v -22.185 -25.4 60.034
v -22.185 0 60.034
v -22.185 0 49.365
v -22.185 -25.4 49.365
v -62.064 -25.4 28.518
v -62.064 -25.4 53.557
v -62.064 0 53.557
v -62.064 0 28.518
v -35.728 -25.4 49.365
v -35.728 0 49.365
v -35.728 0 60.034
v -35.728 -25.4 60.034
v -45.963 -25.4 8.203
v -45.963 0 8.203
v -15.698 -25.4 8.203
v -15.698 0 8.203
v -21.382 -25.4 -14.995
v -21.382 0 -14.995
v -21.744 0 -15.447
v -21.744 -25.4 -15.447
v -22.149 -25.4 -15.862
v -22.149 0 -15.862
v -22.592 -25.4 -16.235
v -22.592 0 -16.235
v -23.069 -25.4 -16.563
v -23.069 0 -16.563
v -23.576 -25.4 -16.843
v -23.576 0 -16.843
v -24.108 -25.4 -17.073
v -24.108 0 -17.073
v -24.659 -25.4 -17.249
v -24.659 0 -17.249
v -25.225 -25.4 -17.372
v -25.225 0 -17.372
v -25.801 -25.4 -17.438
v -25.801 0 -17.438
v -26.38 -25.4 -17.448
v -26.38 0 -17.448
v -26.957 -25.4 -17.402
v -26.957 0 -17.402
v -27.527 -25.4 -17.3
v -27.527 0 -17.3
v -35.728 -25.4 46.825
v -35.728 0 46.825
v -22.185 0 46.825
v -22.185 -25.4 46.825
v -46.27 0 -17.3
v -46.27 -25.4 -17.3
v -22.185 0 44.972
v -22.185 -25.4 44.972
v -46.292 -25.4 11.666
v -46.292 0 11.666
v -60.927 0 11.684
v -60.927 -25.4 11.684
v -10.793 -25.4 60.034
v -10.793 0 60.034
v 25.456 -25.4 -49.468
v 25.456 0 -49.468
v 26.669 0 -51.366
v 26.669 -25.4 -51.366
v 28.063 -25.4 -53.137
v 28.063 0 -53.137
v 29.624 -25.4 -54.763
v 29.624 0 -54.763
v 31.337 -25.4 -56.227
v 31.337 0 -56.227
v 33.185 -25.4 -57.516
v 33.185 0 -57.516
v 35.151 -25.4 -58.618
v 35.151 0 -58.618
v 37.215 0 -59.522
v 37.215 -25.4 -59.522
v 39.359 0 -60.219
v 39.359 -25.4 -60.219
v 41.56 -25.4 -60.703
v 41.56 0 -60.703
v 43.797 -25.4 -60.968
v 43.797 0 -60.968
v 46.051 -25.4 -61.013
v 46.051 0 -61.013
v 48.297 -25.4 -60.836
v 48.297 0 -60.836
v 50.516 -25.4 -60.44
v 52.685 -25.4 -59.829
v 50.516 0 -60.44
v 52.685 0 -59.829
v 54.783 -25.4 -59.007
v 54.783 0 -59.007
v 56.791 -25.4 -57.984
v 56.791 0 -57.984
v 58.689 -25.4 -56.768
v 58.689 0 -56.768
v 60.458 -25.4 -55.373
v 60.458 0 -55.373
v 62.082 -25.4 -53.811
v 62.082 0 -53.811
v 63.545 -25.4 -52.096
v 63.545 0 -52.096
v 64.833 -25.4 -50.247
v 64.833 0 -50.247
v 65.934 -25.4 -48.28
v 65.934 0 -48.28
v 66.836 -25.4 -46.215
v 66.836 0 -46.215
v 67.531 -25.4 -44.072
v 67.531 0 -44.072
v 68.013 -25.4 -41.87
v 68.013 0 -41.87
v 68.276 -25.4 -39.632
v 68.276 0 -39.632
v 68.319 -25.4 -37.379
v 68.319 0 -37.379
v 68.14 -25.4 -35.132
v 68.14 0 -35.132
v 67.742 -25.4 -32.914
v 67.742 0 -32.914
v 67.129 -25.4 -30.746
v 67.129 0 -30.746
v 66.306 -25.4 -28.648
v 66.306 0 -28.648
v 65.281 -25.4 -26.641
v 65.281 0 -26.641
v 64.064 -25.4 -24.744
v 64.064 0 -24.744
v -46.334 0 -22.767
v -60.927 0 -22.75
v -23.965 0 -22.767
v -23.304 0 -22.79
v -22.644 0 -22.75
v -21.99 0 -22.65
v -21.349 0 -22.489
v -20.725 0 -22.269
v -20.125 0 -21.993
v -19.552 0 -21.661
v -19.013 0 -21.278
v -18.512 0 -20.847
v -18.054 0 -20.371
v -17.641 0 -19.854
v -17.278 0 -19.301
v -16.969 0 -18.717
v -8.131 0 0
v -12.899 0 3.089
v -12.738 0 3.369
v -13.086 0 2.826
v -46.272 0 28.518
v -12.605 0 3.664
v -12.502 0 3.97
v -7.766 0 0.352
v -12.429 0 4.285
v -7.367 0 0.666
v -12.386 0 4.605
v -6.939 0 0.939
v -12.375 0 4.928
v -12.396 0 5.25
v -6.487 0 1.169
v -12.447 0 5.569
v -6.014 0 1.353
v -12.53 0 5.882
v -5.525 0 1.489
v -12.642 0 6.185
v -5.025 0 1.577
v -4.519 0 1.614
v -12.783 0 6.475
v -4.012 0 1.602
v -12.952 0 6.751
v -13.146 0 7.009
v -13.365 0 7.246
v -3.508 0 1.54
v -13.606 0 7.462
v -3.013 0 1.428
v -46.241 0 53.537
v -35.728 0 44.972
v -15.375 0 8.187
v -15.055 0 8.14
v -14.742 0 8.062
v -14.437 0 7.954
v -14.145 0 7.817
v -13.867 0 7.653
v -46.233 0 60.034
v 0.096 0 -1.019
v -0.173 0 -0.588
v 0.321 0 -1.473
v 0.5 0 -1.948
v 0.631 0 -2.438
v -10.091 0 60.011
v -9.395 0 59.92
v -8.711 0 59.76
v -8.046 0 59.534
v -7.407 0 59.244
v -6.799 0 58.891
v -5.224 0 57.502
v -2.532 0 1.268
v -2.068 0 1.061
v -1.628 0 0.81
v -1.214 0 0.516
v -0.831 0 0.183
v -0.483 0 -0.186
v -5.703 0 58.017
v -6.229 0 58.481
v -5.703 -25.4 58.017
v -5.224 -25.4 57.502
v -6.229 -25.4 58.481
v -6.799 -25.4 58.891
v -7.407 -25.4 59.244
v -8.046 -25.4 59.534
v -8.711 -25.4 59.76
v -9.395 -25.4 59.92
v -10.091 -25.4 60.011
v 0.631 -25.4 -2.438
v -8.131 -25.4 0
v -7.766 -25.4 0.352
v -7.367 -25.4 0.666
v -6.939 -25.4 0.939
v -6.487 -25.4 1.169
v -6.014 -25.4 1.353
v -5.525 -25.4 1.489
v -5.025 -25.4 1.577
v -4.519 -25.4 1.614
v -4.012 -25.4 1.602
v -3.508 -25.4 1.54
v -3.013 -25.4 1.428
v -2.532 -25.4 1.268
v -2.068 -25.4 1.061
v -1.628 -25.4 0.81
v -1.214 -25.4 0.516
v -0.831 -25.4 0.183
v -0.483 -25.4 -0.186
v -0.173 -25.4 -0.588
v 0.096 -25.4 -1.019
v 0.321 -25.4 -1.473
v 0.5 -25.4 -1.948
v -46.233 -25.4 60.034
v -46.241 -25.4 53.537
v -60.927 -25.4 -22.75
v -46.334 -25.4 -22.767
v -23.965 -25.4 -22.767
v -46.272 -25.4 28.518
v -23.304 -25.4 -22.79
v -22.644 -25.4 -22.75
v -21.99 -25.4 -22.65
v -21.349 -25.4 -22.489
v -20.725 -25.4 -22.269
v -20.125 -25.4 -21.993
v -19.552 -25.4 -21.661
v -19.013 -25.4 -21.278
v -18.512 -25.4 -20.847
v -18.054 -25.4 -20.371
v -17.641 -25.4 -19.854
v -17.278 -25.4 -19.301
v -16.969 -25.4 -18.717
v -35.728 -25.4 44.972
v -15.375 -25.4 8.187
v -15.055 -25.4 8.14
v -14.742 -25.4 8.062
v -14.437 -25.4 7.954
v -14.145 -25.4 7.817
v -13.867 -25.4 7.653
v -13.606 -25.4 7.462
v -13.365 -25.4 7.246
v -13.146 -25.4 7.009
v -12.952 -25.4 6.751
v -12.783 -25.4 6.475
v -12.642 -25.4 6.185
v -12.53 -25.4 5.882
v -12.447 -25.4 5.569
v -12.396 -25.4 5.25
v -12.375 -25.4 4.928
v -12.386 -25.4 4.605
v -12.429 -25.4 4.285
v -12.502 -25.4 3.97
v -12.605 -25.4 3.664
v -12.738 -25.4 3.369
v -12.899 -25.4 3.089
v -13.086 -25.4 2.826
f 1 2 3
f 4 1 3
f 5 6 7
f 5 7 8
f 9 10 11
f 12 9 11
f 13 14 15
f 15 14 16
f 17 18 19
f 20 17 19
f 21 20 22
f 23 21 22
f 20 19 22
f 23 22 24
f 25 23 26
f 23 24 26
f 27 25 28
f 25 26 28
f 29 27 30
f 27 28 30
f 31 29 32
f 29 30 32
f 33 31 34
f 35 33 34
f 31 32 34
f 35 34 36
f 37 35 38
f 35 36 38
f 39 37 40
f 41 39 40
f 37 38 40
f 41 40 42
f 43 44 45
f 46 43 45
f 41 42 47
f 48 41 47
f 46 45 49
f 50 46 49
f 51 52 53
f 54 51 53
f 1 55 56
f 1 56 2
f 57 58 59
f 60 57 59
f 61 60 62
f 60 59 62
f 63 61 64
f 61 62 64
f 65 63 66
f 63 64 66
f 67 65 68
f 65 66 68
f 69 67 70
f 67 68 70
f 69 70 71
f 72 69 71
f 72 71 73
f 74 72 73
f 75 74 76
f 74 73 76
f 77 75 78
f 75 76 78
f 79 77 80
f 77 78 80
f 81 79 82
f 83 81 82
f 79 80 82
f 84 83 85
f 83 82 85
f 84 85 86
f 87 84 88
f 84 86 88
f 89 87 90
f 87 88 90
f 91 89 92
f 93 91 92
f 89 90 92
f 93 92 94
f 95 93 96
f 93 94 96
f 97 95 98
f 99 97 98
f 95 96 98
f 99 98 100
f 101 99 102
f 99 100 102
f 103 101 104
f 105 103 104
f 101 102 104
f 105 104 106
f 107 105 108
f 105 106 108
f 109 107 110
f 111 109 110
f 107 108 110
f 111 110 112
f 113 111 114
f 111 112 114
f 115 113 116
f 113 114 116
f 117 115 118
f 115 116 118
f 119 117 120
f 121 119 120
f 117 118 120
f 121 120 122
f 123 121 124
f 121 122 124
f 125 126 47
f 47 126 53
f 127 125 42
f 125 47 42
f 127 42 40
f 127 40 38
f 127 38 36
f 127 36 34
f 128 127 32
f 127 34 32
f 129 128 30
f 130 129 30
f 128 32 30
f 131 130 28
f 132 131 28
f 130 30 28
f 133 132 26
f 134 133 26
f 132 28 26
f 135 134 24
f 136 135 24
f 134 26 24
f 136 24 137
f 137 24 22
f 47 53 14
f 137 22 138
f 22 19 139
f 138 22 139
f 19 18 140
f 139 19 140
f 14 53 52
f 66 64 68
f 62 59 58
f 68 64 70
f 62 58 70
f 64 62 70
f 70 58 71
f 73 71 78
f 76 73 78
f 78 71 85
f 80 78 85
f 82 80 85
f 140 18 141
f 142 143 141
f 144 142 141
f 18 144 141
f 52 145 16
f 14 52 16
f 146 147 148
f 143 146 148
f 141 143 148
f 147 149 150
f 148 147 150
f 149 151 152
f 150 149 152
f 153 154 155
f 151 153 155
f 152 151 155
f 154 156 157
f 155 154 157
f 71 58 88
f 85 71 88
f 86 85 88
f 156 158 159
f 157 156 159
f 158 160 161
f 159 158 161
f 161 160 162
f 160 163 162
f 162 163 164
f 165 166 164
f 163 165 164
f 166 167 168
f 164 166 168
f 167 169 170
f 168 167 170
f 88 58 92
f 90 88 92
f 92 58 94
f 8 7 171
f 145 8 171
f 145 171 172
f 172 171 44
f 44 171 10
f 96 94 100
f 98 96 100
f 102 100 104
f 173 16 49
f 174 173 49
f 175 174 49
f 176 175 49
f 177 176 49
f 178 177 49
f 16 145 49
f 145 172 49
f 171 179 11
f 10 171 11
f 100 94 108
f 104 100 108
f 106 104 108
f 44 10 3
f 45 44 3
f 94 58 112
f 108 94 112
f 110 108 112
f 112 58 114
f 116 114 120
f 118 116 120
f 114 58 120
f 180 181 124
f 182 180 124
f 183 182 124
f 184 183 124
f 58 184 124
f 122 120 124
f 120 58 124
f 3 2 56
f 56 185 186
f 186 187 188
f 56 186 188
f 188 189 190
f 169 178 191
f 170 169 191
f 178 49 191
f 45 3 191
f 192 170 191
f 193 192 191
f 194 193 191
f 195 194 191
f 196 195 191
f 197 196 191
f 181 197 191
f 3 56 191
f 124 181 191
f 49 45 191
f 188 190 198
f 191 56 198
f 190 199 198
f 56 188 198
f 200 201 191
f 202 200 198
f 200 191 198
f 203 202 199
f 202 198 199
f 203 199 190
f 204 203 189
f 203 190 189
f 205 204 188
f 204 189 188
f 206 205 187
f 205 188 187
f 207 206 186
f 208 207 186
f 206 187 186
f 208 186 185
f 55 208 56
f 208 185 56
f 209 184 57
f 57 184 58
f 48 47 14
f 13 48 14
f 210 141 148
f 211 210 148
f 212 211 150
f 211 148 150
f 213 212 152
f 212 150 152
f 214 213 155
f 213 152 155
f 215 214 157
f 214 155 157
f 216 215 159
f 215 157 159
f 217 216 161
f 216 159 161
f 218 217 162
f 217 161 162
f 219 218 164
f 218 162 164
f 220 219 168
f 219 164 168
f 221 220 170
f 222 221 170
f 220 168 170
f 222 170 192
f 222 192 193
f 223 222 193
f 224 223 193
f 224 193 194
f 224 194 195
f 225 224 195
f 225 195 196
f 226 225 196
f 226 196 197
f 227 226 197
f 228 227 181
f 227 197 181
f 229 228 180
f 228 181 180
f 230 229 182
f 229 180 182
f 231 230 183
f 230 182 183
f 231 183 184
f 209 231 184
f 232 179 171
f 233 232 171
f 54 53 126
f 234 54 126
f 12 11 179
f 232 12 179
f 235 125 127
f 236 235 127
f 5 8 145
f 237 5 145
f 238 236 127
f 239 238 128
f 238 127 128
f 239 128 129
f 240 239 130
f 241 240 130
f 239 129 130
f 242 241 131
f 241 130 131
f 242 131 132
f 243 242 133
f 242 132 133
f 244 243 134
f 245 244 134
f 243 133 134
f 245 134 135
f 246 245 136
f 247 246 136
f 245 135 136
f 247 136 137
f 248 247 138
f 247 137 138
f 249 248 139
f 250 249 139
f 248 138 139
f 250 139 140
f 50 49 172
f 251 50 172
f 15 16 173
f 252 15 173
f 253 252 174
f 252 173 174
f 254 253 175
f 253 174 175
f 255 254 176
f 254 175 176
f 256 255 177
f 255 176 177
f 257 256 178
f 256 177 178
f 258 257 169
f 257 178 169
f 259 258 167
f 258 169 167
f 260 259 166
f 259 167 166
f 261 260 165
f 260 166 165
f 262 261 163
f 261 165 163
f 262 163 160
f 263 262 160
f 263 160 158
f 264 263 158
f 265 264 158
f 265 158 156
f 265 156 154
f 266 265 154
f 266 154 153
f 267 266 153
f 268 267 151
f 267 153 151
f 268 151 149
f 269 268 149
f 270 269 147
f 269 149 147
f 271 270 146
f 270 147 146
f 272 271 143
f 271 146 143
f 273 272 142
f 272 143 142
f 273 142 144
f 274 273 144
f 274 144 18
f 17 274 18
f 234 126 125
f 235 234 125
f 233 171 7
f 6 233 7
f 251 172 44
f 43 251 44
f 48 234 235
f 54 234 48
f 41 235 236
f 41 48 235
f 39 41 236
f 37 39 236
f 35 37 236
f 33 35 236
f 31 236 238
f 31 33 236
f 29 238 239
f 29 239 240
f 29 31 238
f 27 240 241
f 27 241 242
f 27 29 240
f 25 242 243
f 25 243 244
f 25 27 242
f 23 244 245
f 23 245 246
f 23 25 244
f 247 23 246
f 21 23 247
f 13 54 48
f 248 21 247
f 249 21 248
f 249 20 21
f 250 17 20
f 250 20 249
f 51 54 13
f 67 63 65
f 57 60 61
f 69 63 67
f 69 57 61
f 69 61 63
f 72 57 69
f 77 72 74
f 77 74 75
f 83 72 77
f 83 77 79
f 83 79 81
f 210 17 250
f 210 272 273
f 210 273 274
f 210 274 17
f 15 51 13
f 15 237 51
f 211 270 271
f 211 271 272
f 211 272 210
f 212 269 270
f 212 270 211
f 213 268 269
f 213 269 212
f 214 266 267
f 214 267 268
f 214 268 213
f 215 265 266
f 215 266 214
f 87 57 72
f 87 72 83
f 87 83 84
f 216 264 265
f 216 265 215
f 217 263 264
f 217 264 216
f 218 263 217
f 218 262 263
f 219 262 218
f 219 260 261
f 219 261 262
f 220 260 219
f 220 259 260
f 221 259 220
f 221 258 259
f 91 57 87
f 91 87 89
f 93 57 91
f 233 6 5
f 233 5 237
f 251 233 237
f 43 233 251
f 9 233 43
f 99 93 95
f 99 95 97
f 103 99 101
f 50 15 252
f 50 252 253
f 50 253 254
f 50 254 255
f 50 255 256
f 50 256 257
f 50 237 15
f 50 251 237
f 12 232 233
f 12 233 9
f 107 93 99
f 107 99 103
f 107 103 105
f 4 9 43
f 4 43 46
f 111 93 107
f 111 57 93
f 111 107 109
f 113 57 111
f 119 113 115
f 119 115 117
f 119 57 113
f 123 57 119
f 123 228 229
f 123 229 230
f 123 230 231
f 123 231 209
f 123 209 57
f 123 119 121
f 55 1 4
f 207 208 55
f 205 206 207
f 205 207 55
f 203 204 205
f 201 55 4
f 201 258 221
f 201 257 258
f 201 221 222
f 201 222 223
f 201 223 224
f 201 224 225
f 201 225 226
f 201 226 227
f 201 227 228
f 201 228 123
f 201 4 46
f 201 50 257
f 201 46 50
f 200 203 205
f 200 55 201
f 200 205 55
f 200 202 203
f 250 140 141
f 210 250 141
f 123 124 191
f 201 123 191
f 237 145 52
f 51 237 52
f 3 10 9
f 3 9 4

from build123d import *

# Parameters (mm, degrees)
F0_W     = 13.5431550443
F0_H     = 2.539999783
F1_DEPTH = 14.478
F2_DEPTH = 25.4
F3_DEPTH = 15.24


with BuildPart() as f1:
    # F0 (on Front) → F1 (new body)
    with BuildSketch(Plane.XZ):
        with BuildLine():
            Line((-35.7278846204, 60.0338317454), (-46.2333224714, 60.0338317454))
            Line((-46.2333224714, 60.0338317454), (-46.2412260565, 53.5373517857))
            Line((-46.2412260565, 53.5373517857), (-62.0638123778, 53.5566014653))
            Line((-62.0638123778, 53.5566014653), (-62.0638123778, 28.5179335624))
            Line((-62.0638123778, 28.5179335624), (-46.2716645559, 28.5179335624))
            Line((-46.2716645559, 28.5179335624), (-46.2921659325, 11.6664945766))
            Line((-46.2921659325, 11.6664945766), (-60.9269401373, 11.6842991698))
            Line((-60.9269401373, 11.6842991698), (-60.9269401373, -11.473370716))
            Line((-60.9269401373, -11.473370716), (-60.9269401373, -12.8805553541))
            Line((-60.9269401373, -12.8805553541), (-60.9269401373, -22.7496541921))
            Line((-60.9269401373, -22.7496541921), (-46.3340580463, -22.7674078196))
            Line((-46.3340580463, -22.7674078196), (-23.9646863192, -22.7674078196))
            ThreePointArc((-23.9646863192, -22.7674078196), (-19.834707978, -21.8336374971), (-16.9685035944, -18.7169853598))
            Line((-16.9685035944, -18.7169853598), (-8.1312218681, 0))
            ThreePointArc((-8.1312218681, 0), (-3.0133196127, 1.4278545799), (0.6314046332, -2.4383680429))
            Line((0.6314046332, -2.4383680429), (25.4555270076, -49.4676344097))
            ThreePointArc((25.4555270076, -49.4676344097), (57.7549127304, -57.3994035782), (64.0637204051, -24.7442014515))
            Line((64.0637204051, -24.7442014515), (-5.2241440862, 57.5024038553))
            ThreePointArc((-5.2241440862, 57.5024038553), (-7.7229671621, 59.3967704345), (-10.7932919636, 60.0338317454))
            Line((-10.7932919636, 60.0338317454), (-22.1847295761, 60.0338317454))
            Line((-22.1847295761, 60.0338317454), (-22.1847295761, 49.3648834527))
            Line((-22.1847295761, 49.3648834527), (-22.1847295761, 46.8248836696))
            Line((-22.1847295761, 46.8248836696), (-22.1847295761, 44.971819967))
            Line((-22.1847295761, 44.971819967), (-35.7278846204, 44.971819967))
            Line((-35.7278846204, 44.971819967), (-35.7278846204, 46.8248836696))
            Line((-35.7278846204, 46.8248836696), (-35.7278846204, 49.3648834527))
            Line((-35.7278846204, 49.3648834527), (-35.7278846204, 60.0338317454))
        make_face()
        with BuildLine():
            Line((-27.5272410363, -17.2997955233), (-46.2700650096, -17.2997955233))
            Line((-46.2700650096, -17.2997955233), (-45.9628067911, 8.202736266))
            Line((-45.9628067911, 8.202736266), (-15.6977549195, 8.202736266))
            ThreePointArc((-15.6977549195, 8.202736266), (-12.7088773009, 6.3316862366), (-13.0860488862, 2.8256971855))
            Line((-13.0860488862, 2.8256971855), (-21.3820524514, -14.9953495711))
            ThreePointArc((-21.3820524514, -14.9953495711), (-24.1077143058, -17.0727256217), (-27.5272410363, -17.2997955233))
        make_face(mode=Mode.SUBTRACT)
        with Locations((-28.9563070983, 48.0948835611)):
            Rectangle(F0_W, F0_H)
    extrude(amount=F1_DEPTH)

    # F0 (on Front) → F2 (join)
    with BuildSketch(Plane.XZ):
        with BuildLine():
            Line((-35.7278846204, 60.0338317454), (-46.2333224714, 60.0338317454))
            Line((-46.2333224714, 60.0338317454), (-46.2412260565, 53.5373517857))
            Line((-46.2412260565, 53.5373517857), (-62.0638123778, 53.5566014653))
            Line((-62.0638123778, 53.5566014653), (-62.0638123778, 28.5179335624))
            Line((-62.0638123778, 28.5179335624), (-46.2716645559, 28.5179335624))
            Line((-46.2716645559, 28.5179335624), (-46.2921659325, 11.6664945766))
            Line((-46.2921659325, 11.6664945766), (-60.9269401373, 11.6842991698))
            Line((-60.9269401373, 11.6842991698), (-60.9269401373, -11.473370716))
            Line((-60.9269401373, -11.473370716), (-60.9269401373, -12.8805553541))
            Line((-60.9269401373, -12.8805553541), (-60.9269401373, -22.7496541921))
            Line((-60.9269401373, -22.7496541921), (-46.3340580463, -22.7674078196))
            Line((-46.3340580463, -22.7674078196), (-23.9646863192, -22.7674078196))
            ThreePointArc((-23.9646863192, -22.7674078196), (-19.834707978, -21.8336374971), (-16.9685035944, -18.7169853598))
            Line((-16.9685035944, -18.7169853598), (-8.1312218681, 0))
            ThreePointArc((-8.1312218681, 0), (-3.0133196127, 1.4278545799), (0.6314046332, -2.4383680429))
            Line((0.6314046332, -2.4383680429), (25.4555270076, -49.4676344097))
            ThreePointArc((25.4555270076, -49.4676344097), (57.7549127304, -57.3994035782), (64.0637204051, -24.7442014515))
            Line((64.0637204051, -24.7442014515), (-5.2241440862, 57.5024038553))
            ThreePointArc((-5.2241440862, 57.5024038553), (-7.7229671621, 59.3967704345), (-10.7932919636, 60.0338317454))
            Line((-10.7932919636, 60.0338317454), (-22.1847295761, 60.0338317454))
            Line((-22.1847295761, 60.0338317454), (-22.1847295761, 49.3648834527))
            Line((-22.1847295761, 49.3648834527), (-22.1847295761, 46.8248836696))
            Line((-22.1847295761, 46.8248836696), (-22.1847295761, 44.971819967))
            Line((-22.1847295761, 44.971819967), (-35.7278846204, 44.971819967))
            Line((-35.7278846204, 44.971819967), (-35.7278846204, 46.8248836696))
            Line((-35.7278846204, 46.8248836696), (-35.7278846204, 49.3648834527))
            Line((-35.7278846204, 49.3648834527), (-35.7278846204, 60.0338317454))
        make_face()
        with BuildLine():
            Line((-27.5272410363, -17.2997955233), (-46.2700650096, -17.2997955233))
            Line((-46.2700650096, -17.2997955233), (-45.9628067911, 8.202736266))
            Line((-45.9628067911, 8.202736266), (-15.6977549195, 8.202736266))
            ThreePointArc((-15.6977549195, 8.202736266), (-12.7088773009, 6.3316862366), (-13.0860488862, 2.8256971855))
            Line((-13.0860488862, 2.8256971855), (-21.3820524514, -14.9953495711))
            ThreePointArc((-21.3820524514, -14.9953495711), (-24.1077143058, -17.0727256217), (-27.5272410363, -17.2997955233))
        make_face(mode=Mode.SUBTRACT)
        with Locations((-28.9563070983, 48.0948835611)):
            Rectangle(F0_W, F0_H)
    extrude(amount=F2_DEPTH)

    # F0 (on Front) → F3 (join)
    with BuildSketch(Plane.XZ):
        with Locations((-28.9563070983, 48.0948835611)):
            Rectangle(F0_W, F0_H)
    extrude(amount=F3_DEPTH)


solid = f1.part
